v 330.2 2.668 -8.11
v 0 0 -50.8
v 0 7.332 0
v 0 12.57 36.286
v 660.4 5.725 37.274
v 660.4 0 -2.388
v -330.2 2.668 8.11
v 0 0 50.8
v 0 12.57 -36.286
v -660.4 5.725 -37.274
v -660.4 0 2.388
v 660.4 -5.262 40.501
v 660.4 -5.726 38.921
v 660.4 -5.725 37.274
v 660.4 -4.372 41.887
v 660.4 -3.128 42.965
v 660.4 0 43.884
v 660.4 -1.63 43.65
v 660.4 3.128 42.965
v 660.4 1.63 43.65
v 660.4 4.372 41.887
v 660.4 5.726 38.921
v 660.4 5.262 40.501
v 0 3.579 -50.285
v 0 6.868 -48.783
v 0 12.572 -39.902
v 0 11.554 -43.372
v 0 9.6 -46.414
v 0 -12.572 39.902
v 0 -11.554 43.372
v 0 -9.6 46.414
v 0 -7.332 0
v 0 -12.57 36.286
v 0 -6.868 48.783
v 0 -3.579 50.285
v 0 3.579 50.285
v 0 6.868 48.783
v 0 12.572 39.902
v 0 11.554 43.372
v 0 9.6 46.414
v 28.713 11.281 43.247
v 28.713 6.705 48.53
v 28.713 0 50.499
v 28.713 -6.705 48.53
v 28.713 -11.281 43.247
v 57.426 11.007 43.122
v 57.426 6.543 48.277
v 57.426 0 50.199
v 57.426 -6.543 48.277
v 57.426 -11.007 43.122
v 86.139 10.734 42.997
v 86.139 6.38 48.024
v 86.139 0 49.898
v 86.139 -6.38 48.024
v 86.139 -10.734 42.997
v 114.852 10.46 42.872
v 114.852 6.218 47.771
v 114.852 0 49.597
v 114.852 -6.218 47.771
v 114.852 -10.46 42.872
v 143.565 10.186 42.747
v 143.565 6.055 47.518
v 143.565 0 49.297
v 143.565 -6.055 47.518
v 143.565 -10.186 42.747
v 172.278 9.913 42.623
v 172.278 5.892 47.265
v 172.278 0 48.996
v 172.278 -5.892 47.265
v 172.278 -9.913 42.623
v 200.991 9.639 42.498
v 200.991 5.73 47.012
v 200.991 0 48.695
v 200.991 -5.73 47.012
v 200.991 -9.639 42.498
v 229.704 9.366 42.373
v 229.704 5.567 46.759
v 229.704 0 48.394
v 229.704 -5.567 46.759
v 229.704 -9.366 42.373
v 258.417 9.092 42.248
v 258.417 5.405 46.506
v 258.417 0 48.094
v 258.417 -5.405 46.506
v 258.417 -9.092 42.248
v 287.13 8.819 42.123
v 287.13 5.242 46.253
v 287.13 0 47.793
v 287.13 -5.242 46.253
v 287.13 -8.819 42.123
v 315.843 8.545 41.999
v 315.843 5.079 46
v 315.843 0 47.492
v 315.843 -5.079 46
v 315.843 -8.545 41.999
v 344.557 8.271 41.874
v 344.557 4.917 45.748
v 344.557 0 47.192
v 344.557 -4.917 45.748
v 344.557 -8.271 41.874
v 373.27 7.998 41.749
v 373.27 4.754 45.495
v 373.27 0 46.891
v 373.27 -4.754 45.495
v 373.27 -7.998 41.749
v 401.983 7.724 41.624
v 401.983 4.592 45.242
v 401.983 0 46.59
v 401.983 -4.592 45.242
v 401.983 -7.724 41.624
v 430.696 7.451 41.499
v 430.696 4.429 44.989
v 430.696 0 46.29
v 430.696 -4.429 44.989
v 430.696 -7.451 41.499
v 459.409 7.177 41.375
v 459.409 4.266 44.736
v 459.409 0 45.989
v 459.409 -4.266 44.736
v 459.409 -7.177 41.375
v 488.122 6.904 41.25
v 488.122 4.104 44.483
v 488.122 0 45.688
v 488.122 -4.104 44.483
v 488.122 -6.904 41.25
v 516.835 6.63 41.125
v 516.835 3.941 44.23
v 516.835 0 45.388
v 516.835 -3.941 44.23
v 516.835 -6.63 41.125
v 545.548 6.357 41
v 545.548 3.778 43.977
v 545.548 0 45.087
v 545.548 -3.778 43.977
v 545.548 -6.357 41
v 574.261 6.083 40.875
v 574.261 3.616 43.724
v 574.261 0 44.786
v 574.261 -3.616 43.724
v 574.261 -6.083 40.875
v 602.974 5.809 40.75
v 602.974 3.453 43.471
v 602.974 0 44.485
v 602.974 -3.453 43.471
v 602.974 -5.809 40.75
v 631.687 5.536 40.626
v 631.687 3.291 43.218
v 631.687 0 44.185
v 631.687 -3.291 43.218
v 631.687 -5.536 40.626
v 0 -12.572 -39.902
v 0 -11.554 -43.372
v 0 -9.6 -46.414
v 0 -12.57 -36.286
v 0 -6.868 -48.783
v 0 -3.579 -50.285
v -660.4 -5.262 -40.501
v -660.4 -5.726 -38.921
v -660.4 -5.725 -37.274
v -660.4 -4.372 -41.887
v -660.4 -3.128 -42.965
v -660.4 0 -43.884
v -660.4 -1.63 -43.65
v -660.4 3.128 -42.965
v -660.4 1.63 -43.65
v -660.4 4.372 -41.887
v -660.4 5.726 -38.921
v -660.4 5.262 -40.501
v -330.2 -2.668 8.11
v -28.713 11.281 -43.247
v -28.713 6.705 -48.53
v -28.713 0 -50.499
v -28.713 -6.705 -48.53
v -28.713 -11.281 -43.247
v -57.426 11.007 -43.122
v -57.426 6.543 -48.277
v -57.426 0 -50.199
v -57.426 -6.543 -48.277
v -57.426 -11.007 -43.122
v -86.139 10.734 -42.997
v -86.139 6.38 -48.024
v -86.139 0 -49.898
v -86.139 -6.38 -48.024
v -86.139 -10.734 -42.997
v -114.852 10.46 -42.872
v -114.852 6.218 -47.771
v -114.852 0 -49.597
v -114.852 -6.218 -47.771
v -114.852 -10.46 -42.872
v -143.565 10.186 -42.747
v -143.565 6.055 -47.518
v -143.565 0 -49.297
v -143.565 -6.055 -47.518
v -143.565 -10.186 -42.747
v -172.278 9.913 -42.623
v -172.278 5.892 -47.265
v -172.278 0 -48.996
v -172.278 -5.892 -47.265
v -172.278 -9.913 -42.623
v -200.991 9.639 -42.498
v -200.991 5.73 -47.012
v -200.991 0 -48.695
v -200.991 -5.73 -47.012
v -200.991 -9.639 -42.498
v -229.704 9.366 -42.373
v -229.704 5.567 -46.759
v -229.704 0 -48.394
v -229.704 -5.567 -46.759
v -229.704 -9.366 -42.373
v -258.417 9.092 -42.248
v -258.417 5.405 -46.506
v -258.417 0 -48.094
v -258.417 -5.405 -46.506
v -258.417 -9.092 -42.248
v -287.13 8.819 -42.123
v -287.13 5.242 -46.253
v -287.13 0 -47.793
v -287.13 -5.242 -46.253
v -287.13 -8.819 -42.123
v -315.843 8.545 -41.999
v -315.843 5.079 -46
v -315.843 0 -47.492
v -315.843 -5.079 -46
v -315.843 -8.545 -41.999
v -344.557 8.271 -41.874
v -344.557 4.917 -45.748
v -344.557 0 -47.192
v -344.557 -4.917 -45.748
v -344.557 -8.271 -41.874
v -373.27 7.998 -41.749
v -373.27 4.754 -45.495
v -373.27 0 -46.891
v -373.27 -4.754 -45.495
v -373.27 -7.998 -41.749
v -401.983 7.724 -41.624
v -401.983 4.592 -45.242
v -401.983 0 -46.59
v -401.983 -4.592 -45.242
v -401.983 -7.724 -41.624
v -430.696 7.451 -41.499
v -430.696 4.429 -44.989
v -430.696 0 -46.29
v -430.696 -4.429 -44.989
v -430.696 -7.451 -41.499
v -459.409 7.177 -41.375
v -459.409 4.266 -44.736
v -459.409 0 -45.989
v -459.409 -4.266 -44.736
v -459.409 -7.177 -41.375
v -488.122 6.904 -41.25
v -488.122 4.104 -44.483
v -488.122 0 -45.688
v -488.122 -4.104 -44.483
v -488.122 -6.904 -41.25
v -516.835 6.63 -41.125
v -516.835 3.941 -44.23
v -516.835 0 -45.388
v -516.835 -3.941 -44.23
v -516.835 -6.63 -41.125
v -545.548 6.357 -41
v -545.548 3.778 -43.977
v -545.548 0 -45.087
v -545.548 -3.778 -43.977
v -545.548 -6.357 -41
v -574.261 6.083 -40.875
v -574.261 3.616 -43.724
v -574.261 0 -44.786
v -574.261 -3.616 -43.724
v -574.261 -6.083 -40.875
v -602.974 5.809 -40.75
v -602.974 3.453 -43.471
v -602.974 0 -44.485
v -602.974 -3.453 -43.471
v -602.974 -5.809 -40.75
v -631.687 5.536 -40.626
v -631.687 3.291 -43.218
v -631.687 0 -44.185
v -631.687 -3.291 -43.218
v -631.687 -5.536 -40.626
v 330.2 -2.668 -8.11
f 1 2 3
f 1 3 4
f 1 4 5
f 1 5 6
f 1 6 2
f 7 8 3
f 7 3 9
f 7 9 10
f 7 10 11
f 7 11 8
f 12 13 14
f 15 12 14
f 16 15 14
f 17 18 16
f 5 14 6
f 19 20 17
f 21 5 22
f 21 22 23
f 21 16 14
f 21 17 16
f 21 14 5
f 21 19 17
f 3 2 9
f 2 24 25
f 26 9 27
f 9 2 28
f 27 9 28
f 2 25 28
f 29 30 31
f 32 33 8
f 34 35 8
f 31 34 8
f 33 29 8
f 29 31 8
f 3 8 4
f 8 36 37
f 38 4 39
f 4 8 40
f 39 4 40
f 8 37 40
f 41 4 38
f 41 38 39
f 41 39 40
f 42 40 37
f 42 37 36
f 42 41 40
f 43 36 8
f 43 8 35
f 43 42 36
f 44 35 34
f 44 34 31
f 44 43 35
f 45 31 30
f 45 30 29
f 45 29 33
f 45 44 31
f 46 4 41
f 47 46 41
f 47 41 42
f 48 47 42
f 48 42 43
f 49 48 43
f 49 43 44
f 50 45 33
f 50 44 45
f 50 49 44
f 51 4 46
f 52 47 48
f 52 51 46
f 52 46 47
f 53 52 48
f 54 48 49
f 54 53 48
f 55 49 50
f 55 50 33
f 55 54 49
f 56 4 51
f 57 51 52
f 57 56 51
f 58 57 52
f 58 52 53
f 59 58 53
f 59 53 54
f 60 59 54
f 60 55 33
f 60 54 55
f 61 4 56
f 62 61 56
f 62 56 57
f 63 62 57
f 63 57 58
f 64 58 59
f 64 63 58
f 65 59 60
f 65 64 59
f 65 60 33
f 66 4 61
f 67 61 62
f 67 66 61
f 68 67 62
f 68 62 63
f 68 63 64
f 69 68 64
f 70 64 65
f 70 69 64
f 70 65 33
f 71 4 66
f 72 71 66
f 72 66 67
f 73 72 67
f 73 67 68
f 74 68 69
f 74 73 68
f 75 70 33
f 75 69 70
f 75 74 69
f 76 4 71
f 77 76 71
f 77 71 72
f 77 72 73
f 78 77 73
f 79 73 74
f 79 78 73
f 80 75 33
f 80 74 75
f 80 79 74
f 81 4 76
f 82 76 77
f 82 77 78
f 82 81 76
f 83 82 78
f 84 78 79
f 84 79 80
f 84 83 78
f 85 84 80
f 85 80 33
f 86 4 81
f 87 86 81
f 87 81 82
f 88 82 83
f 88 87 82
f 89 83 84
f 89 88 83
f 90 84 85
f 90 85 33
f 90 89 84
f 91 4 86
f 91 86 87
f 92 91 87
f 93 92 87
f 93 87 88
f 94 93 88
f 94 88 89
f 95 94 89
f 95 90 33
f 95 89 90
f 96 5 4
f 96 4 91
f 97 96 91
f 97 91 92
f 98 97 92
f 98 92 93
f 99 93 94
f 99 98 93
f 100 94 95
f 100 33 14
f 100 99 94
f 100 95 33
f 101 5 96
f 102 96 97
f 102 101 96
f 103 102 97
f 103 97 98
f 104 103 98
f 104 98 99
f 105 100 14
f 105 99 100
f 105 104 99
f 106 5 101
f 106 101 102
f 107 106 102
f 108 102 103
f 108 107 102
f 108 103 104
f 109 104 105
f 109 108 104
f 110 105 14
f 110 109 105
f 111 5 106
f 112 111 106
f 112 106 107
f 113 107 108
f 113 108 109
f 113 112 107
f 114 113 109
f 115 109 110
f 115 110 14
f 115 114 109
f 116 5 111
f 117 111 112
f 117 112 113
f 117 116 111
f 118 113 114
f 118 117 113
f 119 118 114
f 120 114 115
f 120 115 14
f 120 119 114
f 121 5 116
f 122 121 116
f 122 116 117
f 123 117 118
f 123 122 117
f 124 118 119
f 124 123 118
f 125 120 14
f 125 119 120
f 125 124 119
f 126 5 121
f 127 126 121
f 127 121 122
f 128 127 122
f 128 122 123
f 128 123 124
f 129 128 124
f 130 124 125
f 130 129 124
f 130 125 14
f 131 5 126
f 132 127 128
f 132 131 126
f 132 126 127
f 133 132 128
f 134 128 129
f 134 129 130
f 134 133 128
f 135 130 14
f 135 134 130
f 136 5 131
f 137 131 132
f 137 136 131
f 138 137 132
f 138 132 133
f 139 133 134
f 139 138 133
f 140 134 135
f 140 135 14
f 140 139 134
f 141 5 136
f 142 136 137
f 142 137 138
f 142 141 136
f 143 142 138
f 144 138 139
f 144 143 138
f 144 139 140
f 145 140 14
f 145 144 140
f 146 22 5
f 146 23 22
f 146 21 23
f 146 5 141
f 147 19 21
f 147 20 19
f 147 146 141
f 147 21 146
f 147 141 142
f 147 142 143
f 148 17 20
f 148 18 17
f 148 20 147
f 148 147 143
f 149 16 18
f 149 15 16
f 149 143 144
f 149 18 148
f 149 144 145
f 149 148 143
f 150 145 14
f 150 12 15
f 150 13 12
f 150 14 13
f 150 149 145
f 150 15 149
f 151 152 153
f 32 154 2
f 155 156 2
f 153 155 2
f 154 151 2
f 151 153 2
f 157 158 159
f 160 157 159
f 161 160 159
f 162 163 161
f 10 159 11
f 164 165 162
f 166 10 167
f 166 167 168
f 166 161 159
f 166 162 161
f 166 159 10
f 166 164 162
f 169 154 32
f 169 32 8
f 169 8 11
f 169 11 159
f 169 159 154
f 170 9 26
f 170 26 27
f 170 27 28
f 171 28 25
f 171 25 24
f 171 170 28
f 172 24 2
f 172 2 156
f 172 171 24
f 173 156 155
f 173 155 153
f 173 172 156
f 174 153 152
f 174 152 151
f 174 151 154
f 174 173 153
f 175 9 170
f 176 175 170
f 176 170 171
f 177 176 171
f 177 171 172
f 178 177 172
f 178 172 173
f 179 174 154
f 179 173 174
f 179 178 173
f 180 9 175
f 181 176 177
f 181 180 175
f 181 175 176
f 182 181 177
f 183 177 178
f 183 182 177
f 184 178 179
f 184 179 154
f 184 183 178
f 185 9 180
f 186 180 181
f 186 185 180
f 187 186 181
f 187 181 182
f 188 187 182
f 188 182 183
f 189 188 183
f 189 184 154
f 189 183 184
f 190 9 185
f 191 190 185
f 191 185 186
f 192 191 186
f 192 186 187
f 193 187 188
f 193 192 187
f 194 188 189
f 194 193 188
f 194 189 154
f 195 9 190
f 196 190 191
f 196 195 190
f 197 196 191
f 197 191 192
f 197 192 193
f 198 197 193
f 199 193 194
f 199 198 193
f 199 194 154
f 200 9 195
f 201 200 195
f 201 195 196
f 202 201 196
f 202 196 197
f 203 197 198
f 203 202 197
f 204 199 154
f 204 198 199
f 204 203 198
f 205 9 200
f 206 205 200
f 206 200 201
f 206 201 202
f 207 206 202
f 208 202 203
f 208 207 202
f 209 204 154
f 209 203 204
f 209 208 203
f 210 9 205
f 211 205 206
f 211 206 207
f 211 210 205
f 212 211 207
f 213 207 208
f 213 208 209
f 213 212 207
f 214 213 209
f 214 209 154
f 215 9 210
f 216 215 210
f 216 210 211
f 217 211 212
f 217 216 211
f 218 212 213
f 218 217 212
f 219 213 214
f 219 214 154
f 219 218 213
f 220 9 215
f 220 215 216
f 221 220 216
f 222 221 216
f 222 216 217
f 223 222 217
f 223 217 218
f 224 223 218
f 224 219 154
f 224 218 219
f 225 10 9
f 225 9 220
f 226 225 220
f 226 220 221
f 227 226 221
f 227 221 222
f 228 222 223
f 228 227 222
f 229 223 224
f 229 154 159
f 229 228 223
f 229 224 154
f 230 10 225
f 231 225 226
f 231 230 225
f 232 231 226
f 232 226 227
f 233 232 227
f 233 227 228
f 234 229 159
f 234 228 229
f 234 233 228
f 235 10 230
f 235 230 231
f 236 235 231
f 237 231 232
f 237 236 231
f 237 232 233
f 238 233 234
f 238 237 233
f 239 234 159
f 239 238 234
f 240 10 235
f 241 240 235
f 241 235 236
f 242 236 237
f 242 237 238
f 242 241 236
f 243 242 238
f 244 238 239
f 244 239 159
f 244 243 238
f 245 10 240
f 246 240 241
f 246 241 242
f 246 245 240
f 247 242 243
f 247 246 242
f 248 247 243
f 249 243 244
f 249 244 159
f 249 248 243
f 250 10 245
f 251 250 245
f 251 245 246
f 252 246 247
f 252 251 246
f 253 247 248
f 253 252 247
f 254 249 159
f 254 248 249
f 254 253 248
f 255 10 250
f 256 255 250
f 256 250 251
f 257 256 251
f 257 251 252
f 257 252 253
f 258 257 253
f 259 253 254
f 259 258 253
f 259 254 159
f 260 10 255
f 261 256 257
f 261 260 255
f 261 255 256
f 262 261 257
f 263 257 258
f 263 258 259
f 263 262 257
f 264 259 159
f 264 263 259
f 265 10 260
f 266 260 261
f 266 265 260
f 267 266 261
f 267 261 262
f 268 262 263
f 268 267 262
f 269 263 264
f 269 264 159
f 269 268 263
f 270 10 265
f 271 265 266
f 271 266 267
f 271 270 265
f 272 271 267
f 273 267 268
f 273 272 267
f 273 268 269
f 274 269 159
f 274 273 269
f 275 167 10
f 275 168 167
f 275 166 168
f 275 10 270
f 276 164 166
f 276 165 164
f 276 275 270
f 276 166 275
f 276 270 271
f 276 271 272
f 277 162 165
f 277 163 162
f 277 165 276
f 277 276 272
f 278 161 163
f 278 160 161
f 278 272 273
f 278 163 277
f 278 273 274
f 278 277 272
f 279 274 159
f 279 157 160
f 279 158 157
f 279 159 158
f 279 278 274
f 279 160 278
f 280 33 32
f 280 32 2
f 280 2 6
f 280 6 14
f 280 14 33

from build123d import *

# Parameters (mm, degrees)
BOSS_EXTRUDE1_DEPTH = 660.4
BOSS_EXTRUDE1_TAPER = 0.6
CIRPATTERN1_COUNT   = 2


with BuildPart() as part:
    # Sketch1 → Boss-Extrude1 (new body)
    with BuildSketch(Plane(origin=(0, 0, 0), x_dir=(0, 0, -1), z_dir=(1, 0, 0))):
        with BuildLine():
            Line((50.8, 0), (-36.285714286, 12.569740146))
            ThreePointArc((-36.285714286, 12.569740146), (-50.8, 0), (-36.285714286, -12.569740146))
            Line((-36.285714286, -12.569740146), (50.8, 0))
        make_face()
    boss_extrude1 = extrude(amount=BOSS_EXTRUDE1_DEPTH, taper=BOSS_EXTRUDE1_TAPER)

    # CirPattern1: Boss-Extrude1 ×2 about axis
    cirpattern1_axis = Axis((0, 0, 0), (0, 1, 0))
    for i in range(1, CIRPATTERN1_COUNT):
        add(boss_extrude1.rotate(cirpattern1_axis, i * 360 / CIRPATTERN1_COUNT))


solid = part.part
